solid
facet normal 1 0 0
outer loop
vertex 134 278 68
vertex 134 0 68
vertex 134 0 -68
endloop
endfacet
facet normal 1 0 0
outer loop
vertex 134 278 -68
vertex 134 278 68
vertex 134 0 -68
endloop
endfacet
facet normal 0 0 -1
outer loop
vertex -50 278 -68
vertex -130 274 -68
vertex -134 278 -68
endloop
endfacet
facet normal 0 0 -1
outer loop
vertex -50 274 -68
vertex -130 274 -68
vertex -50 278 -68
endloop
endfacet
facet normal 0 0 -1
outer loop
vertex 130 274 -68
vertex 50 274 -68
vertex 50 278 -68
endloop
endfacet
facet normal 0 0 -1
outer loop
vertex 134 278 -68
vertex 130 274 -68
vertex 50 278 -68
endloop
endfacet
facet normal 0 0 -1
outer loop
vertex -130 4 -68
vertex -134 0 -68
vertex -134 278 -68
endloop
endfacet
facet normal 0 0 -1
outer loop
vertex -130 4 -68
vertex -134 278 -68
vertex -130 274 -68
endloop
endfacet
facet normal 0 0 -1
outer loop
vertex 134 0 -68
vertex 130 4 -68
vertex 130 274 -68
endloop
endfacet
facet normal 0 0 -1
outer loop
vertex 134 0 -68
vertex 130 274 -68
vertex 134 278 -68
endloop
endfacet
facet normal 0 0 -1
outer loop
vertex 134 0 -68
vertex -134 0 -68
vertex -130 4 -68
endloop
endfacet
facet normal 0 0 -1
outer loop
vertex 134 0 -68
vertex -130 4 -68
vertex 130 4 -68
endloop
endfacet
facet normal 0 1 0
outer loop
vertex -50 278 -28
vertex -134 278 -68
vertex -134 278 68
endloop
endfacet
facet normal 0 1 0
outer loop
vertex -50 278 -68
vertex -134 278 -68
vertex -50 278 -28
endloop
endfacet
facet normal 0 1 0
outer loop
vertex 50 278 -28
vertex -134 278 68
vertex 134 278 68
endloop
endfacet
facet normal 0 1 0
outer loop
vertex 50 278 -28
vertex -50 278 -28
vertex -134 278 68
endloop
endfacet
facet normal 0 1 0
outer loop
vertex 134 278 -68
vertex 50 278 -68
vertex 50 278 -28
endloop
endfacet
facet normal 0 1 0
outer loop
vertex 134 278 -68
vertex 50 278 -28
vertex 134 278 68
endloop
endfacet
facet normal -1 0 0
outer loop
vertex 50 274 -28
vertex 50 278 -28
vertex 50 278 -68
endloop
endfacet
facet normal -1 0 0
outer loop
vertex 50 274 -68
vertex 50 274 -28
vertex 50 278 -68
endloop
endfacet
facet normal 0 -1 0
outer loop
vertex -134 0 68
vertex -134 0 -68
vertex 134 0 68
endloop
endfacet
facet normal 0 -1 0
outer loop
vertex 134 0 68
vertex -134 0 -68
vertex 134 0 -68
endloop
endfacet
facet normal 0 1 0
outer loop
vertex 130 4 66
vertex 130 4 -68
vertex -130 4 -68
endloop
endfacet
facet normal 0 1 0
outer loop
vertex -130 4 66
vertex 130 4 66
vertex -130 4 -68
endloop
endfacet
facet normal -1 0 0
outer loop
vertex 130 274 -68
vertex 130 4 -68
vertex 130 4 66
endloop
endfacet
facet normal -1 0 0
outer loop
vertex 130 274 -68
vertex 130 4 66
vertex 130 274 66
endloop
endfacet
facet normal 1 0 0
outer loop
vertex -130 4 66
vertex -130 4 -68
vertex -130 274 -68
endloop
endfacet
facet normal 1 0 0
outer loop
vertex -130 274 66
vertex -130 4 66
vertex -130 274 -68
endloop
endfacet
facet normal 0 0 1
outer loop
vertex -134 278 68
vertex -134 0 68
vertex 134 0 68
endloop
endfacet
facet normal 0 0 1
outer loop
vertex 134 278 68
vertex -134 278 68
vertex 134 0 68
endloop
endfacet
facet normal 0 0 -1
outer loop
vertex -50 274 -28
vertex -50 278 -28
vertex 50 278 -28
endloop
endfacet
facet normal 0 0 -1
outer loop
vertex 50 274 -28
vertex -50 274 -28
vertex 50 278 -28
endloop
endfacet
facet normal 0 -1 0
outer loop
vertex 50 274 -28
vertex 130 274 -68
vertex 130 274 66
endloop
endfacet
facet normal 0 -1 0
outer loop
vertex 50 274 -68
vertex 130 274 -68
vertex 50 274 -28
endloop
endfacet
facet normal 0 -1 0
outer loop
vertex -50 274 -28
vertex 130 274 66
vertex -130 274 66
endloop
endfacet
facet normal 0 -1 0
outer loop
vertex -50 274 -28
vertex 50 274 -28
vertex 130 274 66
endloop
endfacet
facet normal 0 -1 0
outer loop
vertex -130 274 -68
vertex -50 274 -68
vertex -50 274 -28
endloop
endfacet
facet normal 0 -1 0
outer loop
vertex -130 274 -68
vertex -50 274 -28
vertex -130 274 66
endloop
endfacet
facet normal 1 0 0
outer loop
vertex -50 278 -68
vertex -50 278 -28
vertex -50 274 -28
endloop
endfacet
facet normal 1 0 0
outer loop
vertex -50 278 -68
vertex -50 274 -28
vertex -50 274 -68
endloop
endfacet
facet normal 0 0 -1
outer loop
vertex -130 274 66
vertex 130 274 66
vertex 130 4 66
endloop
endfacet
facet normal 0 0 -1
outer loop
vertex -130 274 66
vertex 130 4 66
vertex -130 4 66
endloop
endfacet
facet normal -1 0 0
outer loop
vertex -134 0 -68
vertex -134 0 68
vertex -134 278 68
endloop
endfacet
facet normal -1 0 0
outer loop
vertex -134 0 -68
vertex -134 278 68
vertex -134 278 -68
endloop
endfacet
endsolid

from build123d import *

# Parameters (mm, degrees)
SKETCH_1_W          = 268
SKETCH_1_H          = 136
EXTRUDE_1_DEPTH     = 278
SKETCH_2_W          = 260
SKETCH_2_H          = 270
CUT_EXTRUDE_1_DEPTH = 134
CUT_EXTRUDE_2_REACH = 318.013
SKETCH_3_W          = 100
SKETCH_3_H          = 40


with BuildPart() as part:
    # 草图1 → 凸台-拉伸1 (new body)
    with BuildSketch(Plane(origin=(0, 0, 0), x_dir=(1, 0, 0), z_dir=(0, 1, 0))):
        Rectangle(SKETCH_1_W, SKETCH_1_H)
    extrude(amount=EXTRUDE_1_DEPTH)

    # 草图2 → 切除-拉伸1 (cut)
    with BuildSketch(Plane(origin=(0, 0, -68), x_dir=(-1, 0, 0), z_dir=(0, 0, -1))):
        with Locations((0, 139)):
            Rectangle(SKETCH_2_W, SKETCH_2_H)
    extrude(amount=-CUT_EXTRUDE_1_DEPTH, mode=Mode.SUBTRACT)

    # 草图3 → 切除-拉伸2 (cut, up to next)
    with BuildSketch(Plane(origin=(0, 278, 0), x_dir=(1, 0, 0), z_dir=(0, 1, 0)), mode=Mode.PRIVATE) as cut_extrude_2_sk1:
        with Locations((0, 48)):
            Rectangle(SKETCH_3_W, SKETCH_3_H)
    cut_extrude_2_tool1 = extrude(cut_extrude_2_sk1.sketch, amount=-CUT_EXTRUDE_2_REACH, mode=Mode.PRIVATE) & part.part
    add(cut_extrude_2_tool1.solids().sort_by_distance((0, 278, -48))[0], mode=Mode.SUBTRACT)


solid = part.part
